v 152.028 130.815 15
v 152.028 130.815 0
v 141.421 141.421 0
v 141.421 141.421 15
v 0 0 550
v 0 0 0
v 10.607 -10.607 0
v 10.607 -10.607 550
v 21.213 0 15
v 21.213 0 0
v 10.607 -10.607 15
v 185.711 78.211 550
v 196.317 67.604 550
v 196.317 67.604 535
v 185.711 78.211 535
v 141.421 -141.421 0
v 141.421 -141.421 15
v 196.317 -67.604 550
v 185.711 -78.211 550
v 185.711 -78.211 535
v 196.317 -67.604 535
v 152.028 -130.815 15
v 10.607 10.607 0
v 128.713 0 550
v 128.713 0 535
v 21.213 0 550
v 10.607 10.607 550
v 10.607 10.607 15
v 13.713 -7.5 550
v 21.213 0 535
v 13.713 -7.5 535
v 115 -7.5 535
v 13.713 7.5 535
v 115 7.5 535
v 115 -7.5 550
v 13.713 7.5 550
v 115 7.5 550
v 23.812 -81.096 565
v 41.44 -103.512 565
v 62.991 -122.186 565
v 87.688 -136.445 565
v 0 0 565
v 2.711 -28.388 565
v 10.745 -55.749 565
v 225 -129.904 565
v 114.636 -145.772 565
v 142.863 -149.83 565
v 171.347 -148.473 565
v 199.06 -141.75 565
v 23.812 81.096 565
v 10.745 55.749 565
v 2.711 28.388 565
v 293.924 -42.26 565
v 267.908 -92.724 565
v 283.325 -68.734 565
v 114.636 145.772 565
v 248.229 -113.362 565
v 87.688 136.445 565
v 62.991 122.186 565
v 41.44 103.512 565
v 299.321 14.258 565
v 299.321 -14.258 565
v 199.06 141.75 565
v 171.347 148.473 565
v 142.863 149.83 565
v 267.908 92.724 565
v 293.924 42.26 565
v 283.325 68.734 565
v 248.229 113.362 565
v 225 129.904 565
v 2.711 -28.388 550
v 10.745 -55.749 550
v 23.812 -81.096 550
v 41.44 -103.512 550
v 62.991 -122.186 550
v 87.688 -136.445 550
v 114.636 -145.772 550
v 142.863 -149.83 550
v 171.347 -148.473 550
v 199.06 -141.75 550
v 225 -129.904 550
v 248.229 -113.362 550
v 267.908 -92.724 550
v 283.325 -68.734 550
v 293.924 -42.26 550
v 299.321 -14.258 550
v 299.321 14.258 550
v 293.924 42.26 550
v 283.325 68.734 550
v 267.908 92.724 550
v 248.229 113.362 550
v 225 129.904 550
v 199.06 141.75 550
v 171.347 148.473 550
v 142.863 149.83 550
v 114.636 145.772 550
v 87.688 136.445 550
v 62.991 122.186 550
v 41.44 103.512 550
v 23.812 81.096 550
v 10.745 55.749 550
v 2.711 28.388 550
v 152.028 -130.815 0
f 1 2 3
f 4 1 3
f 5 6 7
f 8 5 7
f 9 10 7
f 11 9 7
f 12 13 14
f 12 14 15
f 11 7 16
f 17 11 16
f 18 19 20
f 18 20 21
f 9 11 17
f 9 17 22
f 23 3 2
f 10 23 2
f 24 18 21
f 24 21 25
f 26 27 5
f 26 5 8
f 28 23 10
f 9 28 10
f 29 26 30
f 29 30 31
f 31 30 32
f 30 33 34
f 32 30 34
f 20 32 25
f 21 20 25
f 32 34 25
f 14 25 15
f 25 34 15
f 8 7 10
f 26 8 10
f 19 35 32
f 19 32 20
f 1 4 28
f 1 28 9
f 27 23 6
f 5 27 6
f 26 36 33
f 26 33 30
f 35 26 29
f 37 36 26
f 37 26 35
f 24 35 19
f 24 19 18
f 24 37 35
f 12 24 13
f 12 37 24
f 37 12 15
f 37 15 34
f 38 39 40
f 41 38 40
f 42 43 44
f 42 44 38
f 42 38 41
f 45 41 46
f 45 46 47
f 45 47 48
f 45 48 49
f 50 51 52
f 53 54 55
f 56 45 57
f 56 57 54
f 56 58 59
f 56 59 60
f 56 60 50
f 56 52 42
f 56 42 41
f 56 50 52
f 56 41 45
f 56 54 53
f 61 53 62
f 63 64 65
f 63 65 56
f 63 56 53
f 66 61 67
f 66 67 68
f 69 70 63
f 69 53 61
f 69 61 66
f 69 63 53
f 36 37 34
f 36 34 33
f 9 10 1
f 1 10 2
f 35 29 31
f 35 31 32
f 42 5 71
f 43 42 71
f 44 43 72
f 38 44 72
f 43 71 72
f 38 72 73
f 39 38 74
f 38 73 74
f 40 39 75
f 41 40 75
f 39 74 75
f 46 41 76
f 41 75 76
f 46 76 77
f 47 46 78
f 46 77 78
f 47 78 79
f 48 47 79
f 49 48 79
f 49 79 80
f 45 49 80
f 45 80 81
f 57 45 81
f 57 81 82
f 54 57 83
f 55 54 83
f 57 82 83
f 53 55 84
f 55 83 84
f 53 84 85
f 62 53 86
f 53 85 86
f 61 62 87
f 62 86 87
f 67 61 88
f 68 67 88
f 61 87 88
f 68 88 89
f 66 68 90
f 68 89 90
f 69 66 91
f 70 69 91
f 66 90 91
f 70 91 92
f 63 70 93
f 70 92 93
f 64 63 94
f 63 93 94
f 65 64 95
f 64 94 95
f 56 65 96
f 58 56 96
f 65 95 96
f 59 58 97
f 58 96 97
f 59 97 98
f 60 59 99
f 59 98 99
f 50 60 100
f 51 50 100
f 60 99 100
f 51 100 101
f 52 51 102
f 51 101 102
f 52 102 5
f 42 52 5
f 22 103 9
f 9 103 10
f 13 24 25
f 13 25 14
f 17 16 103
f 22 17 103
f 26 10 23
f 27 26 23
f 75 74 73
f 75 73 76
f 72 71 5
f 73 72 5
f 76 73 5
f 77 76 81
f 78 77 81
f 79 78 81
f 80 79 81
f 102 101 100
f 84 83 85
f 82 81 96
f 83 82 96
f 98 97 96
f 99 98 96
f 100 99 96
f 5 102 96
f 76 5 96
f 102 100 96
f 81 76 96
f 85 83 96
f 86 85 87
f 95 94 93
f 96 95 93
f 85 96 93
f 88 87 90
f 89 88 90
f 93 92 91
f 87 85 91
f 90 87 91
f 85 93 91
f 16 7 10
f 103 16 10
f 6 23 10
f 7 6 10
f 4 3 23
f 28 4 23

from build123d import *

# Parameters (mm, degrees)
F1_DEPTH = 550
F2_DEPTH = 15
F3_DEPTH = 550
F4_DEPTH = 15
F5_START = 550
F5_DEPTH = 15


with BuildPart() as f1:
    # F0 (on Top) → F1 (new body)
    with BuildSketch(Plane.XY):
        Polygon((10.6066017178, 10.6066017178), (0, 0), (10.6066017178, -10.6066017178), (13.7132034356, -7.5), (21.2132034356, 0), (13.7132034356, 7.5), align=None)
    extrude(amount=F1_DEPTH)


with BuildPart() as f2:
    # F0 (on Top) → F2 (new body)
    with BuildSketch(Plane.XY):
        Polygon((141.4213562373, 141.4213562373), (10.6066017178, 10.6066017178), (13.7132034356, 7.5), (28.7132034356, 7.5), (152.0279579551, 130.8147545195), align=None)
        Polygon((28.7132034356, 7.5), (13.7132034356, 7.5), (21.2132034356, 0), align=None)
    extrude(amount=F2_DEPTH)


with BuildPart() as f2b:
    # F0 (on Top) → F2, piece 2 (new body)
    with BuildSketch(Plane.XY):
        Polygon((13.7132034356, -7.5), (10.6066017178, -10.6066017178), (141.4213562373, -141.4213562373), (152.0279579551, -130.8147545195), (28.7132034356, -7.5), align=None)
        Polygon((21.2132034356, 0), (13.7132034356, -7.5), (28.7132034356, -7.5), align=None)
    extrude(amount=F2_DEPTH)


with BuildPart() as f3:
    # F0 (on Top) → F3 (new body)
    with BuildSketch(Plane.XY):
        Polygon((28.7132034356, 7.5), (21.2132034356, 0), (28.7132034356, -7.5), (115, -7.5), (128.7132034356, -7.5), (128.7132034356, 0), (128.7132034356, 7.5), (115, 7.5), align=None)
        Polygon((28.7132034356, 7.5), (13.7132034356, 7.5), (21.2132034356, 0), align=None)
        Polygon((21.2132034356, 0), (13.7132034356, -7.5), (28.7132034356, -7.5), align=None)
        Polygon((185.7106781187, 78.2106781187), (115, 7.5), (128.7132034356, 7.5), (128.7132034356, 0), (196.3172798365, 67.6040764009), align=None)
        Polygon((128.7132034356, -7.5), (115, -7.5), (185.7106781187, -78.2106781187), (196.3172798365, -67.6040764009), (128.7132034356, 0), align=None)
    extrude(amount=F3_DEPTH)

    # F4 (intersect): a face of the model
    f4_faces = [f3.faces().sort_by_distance(p)[0] for p in [
        (126.2279911766, 0, 550),
    ]]
    extrude(f4_faces, amount=-F4_DEPTH, mode=Mode.INTERSECT)


with BuildPart() as f5:
    # F0 (on Top) → F5 (new body)
    with BuildSketch(Plane.XY.offset(F5_START)):
        with BuildLine():
            ThreePointArc((300, 0), (150, 150), (0, 0))
            ThreePointArc((0, 0), (150, -150), (300, 0))
        make_face()
        Polygon((10.6066017178, -10.6066017178), (0, 0), (10.6066017178, 10.6066017178), (141.4213562373, 141.4213562373), (152.0279579551, 130.8147545195), (28.7132034356, 7.5), (115, 7.5), (185.7106781187, 78.2106781187), (196.3172798365, 67.6040764009), (128.7132034356, 0), (196.3172798365, -67.6040764009), (185.7106781187, -78.2106781187), (115, -7.5), (28.7132034356, -7.5), (152.0279579551, -130.8147545195), (141.4213562373, -141.4213562373), align=None, mode=Mode.SUBTRACT)
        Polygon((185.7106781187, 78.2106781187), (115, 7.5), (128.7132034356, 7.5), (128.7132034356, 0), (196.3172798365, 67.6040764009), align=None)
        Polygon((128.7132034356, -7.5), (115, -7.5), (185.7106781187, -78.2106781187), (196.3172798365, -67.6040764009), (128.7132034356, 0), align=None)
        Polygon((28.7132034356, 7.5), (21.2132034356, 0), (28.7132034356, -7.5), (115, -7.5), (128.7132034356, -7.5), (128.7132034356, 0), (128.7132034356, 7.5), (115, 7.5), align=None)
        Polygon((13.7132034356, -7.5), (10.6066017178, -10.6066017178), (141.4213562373, -141.4213562373), (152.0279579551, -130.8147545195), (28.7132034356, -7.5), align=None)
        Polygon((141.4213562373, 141.4213562373), (10.6066017178, 10.6066017178), (13.7132034356, 7.5), (28.7132034356, 7.5), (152.0279579551, 130.8147545195), align=None)
        Polygon((10.6066017178, 10.6066017178), (0, 0), (10.6066017178, -10.6066017178), (13.7132034356, -7.5), (21.2132034356, 0), (13.7132034356, 7.5), align=None)
        Polygon((21.2132034356, 0), (13.7132034356, -7.5), (28.7132034356, -7.5), align=None)
        Polygon((28.7132034356, 7.5), (13.7132034356, 7.5), (21.2132034356, 0), align=None)
    extrude(amount=F5_DEPTH)


solid = Compound([f1.part, f2.part, f2b.part, f3.part, f5.part])
